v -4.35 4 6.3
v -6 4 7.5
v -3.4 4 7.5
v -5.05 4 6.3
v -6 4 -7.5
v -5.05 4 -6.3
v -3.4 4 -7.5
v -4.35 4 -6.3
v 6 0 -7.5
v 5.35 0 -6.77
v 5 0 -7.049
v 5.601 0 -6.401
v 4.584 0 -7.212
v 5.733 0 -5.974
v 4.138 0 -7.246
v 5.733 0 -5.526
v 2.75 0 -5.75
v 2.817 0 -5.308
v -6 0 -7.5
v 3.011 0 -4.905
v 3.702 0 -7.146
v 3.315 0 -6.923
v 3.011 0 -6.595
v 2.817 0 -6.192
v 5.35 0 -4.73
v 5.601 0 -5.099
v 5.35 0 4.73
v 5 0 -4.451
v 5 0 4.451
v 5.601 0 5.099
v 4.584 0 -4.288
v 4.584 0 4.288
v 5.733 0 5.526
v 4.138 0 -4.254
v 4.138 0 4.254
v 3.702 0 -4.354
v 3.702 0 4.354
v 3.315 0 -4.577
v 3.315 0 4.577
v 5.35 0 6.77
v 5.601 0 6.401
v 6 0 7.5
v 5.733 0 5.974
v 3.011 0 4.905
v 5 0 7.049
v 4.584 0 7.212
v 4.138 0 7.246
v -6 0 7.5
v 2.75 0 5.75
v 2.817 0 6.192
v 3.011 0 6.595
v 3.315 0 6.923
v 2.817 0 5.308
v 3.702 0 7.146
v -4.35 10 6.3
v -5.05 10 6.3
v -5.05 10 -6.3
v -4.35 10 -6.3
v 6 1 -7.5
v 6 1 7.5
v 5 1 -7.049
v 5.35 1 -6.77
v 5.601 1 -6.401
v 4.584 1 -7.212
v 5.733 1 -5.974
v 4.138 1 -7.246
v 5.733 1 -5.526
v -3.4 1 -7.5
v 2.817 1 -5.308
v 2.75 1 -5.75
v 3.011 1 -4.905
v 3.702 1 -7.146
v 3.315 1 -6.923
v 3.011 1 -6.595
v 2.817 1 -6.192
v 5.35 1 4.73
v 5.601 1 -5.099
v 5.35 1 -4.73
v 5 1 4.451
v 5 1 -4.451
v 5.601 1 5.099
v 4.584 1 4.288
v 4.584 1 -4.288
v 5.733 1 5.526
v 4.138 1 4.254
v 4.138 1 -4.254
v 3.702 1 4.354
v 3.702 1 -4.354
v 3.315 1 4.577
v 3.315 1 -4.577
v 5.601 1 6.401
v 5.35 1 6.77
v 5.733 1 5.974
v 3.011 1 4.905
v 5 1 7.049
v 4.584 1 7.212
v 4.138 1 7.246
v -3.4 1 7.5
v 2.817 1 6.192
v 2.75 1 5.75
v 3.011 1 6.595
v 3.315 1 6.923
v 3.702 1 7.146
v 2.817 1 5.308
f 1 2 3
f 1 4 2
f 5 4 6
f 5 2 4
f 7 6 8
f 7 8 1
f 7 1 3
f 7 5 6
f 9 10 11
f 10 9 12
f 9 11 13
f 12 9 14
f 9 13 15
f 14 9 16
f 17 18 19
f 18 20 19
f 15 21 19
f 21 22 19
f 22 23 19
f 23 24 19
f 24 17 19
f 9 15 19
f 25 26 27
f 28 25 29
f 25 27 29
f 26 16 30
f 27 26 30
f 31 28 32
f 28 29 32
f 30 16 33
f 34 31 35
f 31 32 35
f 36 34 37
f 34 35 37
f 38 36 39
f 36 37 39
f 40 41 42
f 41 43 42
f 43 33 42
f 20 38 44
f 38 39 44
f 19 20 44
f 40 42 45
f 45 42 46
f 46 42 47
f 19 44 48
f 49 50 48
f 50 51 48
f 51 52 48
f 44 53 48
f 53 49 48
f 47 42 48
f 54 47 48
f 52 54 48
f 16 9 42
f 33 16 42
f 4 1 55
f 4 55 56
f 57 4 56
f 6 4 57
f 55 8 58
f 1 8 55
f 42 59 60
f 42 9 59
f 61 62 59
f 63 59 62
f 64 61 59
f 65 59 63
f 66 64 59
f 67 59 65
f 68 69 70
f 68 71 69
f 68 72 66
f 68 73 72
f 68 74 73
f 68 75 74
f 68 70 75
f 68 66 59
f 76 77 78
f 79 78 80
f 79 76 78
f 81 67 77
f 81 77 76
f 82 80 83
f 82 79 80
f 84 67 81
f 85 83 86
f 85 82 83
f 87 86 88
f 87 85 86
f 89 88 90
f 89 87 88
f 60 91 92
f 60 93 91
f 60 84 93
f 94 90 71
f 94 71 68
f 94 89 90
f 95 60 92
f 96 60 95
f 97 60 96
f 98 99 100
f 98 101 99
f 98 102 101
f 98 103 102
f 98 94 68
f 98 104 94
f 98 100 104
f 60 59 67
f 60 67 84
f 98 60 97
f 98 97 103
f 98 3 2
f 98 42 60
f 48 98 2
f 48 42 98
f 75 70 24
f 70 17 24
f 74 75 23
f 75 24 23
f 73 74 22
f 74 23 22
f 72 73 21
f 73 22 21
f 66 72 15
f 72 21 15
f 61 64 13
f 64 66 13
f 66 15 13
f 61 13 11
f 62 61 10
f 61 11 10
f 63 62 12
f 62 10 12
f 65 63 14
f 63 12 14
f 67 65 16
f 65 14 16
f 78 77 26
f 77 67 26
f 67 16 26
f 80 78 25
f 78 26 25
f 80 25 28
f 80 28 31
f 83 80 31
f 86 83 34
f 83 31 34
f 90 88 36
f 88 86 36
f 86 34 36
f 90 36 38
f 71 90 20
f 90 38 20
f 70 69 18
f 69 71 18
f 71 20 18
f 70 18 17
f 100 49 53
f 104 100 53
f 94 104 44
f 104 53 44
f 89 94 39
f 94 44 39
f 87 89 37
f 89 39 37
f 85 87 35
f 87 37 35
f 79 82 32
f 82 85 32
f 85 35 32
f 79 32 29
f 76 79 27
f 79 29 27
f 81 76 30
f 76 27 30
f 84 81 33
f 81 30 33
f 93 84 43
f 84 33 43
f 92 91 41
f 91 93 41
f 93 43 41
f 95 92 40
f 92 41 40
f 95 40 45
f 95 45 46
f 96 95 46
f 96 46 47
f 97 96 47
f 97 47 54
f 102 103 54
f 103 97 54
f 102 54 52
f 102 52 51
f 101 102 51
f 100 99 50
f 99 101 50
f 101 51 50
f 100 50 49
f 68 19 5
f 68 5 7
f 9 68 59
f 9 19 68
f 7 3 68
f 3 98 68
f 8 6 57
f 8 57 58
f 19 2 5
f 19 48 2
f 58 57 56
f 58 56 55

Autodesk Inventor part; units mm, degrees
ref_plane "YZ Plane" through (0, 0, 0) normal (1, 0, 0) x (0, 1, 0)
ref_plane "XZ Plane" through (0, 0, 0) normal (0, 1, 0) x (-1, 0, 0)
ref_plane "XY Plane" through (0, 0, 0) normal (0, 0, 1) x (1, 0, 0)
sketch "Sketch1" plane through (0, 0, 0) normal (0, 1, 0) x (-1, 0, 0)
  line L0 (-6, 7.5) -> (6, 7.5)
  line L1 (6, 7.5) -> (6, -7.5)
  line L2 (6, -7.5) -> (-6, -7.5)
  line L3 (-6, -7.5) -> (-6, 7.5)
  line L4 (-6, 7.5) -> (6, -7.5) construction
  line L5 (6, 7.5) -> (-6, -7.5) construction
  line L6 (-6, 7.5) -> (-4.25, 7.5)
  line L7 (-6, 5.75) -> (-6, 7.5)
  circle A0 centre (-4.25, 5.75) radius 1.5
  line L8 (0, 0) -> (-1.7804, 0)
  circle A1 centre (-4.25, -5.75) radius 1.5
  dimension "d0" = 12
  dimension "d1" = 15
  dimension "d4" = 3
  dimension "d7" = 1.75
extrude "Extrusion1" add sketch "Sketch1" along normal blind 1
sketch "Sketch2" plane through (0, 1, 0) normal (0, 1, 0) x (1, 0, 0)
  line L0 (-6, 7.5) -> (-6, -7.5) projected
  line L1 (-3.4, 7.5) -> (-6, 7.5)
  line L2 (-6, 7.5) -> (-6, -7.5)
  line L3 (-6, -7.5) -> (-3.4, -7.5)
  line L4 (-3.4, -7.5) -> (-3.4, 7.5)
  line L5 (-3.4, 7.5) -> (-6, -7.5) construction
  line L6 (-6, 7.5) -> (-3.4, -7.5) construction
  point P0 (0, 0)
  dimension "d9" = 2.6
  dimension "d10" = 15
extrude "Extrusion2" add sketch "Sketch2" along normal blind 3
sketch "Sketch3" plane through (0, 4, 0) normal (0, 1, 0) x (1, 0, 0)
  line L0 (-6, -7.5) -> (-6, -8) projected
  line L1 (6, 7.5) -> (-3.4, 7.5) projected
  line L2 (-6, 7.5) -> (-6, -7.5) projected
  line L3 (-3.4, -7.5) -> (-3.4, 7.5) projected
  line L4 (-4.35, -6.3) -> (-5.05, -6.3)
  line L5 (-5.05, -6.3) -> (-5.05, 6.3)
  line L6 (-5.05, 6.3) -> (-4.35, 6.3)
  line L7 (-4.35, 6.3) -> (-4.35, -6.3)
  line L8 (-4.35, -6.3) -> (-5.05, 6.3) construction
  line L9 (-5.05, -6.3) -> (-4.35, 6.3) construction
  point P0 (0, 0)
  point P1 (-4.7, 0)
  dimension "d13" = 12.6
  dimension "d14" = 0.7
extrude "Extrusion3" add sketch "Sketch3" along normal blind 6
properties part number "SensorPresionHumedadTemp"
